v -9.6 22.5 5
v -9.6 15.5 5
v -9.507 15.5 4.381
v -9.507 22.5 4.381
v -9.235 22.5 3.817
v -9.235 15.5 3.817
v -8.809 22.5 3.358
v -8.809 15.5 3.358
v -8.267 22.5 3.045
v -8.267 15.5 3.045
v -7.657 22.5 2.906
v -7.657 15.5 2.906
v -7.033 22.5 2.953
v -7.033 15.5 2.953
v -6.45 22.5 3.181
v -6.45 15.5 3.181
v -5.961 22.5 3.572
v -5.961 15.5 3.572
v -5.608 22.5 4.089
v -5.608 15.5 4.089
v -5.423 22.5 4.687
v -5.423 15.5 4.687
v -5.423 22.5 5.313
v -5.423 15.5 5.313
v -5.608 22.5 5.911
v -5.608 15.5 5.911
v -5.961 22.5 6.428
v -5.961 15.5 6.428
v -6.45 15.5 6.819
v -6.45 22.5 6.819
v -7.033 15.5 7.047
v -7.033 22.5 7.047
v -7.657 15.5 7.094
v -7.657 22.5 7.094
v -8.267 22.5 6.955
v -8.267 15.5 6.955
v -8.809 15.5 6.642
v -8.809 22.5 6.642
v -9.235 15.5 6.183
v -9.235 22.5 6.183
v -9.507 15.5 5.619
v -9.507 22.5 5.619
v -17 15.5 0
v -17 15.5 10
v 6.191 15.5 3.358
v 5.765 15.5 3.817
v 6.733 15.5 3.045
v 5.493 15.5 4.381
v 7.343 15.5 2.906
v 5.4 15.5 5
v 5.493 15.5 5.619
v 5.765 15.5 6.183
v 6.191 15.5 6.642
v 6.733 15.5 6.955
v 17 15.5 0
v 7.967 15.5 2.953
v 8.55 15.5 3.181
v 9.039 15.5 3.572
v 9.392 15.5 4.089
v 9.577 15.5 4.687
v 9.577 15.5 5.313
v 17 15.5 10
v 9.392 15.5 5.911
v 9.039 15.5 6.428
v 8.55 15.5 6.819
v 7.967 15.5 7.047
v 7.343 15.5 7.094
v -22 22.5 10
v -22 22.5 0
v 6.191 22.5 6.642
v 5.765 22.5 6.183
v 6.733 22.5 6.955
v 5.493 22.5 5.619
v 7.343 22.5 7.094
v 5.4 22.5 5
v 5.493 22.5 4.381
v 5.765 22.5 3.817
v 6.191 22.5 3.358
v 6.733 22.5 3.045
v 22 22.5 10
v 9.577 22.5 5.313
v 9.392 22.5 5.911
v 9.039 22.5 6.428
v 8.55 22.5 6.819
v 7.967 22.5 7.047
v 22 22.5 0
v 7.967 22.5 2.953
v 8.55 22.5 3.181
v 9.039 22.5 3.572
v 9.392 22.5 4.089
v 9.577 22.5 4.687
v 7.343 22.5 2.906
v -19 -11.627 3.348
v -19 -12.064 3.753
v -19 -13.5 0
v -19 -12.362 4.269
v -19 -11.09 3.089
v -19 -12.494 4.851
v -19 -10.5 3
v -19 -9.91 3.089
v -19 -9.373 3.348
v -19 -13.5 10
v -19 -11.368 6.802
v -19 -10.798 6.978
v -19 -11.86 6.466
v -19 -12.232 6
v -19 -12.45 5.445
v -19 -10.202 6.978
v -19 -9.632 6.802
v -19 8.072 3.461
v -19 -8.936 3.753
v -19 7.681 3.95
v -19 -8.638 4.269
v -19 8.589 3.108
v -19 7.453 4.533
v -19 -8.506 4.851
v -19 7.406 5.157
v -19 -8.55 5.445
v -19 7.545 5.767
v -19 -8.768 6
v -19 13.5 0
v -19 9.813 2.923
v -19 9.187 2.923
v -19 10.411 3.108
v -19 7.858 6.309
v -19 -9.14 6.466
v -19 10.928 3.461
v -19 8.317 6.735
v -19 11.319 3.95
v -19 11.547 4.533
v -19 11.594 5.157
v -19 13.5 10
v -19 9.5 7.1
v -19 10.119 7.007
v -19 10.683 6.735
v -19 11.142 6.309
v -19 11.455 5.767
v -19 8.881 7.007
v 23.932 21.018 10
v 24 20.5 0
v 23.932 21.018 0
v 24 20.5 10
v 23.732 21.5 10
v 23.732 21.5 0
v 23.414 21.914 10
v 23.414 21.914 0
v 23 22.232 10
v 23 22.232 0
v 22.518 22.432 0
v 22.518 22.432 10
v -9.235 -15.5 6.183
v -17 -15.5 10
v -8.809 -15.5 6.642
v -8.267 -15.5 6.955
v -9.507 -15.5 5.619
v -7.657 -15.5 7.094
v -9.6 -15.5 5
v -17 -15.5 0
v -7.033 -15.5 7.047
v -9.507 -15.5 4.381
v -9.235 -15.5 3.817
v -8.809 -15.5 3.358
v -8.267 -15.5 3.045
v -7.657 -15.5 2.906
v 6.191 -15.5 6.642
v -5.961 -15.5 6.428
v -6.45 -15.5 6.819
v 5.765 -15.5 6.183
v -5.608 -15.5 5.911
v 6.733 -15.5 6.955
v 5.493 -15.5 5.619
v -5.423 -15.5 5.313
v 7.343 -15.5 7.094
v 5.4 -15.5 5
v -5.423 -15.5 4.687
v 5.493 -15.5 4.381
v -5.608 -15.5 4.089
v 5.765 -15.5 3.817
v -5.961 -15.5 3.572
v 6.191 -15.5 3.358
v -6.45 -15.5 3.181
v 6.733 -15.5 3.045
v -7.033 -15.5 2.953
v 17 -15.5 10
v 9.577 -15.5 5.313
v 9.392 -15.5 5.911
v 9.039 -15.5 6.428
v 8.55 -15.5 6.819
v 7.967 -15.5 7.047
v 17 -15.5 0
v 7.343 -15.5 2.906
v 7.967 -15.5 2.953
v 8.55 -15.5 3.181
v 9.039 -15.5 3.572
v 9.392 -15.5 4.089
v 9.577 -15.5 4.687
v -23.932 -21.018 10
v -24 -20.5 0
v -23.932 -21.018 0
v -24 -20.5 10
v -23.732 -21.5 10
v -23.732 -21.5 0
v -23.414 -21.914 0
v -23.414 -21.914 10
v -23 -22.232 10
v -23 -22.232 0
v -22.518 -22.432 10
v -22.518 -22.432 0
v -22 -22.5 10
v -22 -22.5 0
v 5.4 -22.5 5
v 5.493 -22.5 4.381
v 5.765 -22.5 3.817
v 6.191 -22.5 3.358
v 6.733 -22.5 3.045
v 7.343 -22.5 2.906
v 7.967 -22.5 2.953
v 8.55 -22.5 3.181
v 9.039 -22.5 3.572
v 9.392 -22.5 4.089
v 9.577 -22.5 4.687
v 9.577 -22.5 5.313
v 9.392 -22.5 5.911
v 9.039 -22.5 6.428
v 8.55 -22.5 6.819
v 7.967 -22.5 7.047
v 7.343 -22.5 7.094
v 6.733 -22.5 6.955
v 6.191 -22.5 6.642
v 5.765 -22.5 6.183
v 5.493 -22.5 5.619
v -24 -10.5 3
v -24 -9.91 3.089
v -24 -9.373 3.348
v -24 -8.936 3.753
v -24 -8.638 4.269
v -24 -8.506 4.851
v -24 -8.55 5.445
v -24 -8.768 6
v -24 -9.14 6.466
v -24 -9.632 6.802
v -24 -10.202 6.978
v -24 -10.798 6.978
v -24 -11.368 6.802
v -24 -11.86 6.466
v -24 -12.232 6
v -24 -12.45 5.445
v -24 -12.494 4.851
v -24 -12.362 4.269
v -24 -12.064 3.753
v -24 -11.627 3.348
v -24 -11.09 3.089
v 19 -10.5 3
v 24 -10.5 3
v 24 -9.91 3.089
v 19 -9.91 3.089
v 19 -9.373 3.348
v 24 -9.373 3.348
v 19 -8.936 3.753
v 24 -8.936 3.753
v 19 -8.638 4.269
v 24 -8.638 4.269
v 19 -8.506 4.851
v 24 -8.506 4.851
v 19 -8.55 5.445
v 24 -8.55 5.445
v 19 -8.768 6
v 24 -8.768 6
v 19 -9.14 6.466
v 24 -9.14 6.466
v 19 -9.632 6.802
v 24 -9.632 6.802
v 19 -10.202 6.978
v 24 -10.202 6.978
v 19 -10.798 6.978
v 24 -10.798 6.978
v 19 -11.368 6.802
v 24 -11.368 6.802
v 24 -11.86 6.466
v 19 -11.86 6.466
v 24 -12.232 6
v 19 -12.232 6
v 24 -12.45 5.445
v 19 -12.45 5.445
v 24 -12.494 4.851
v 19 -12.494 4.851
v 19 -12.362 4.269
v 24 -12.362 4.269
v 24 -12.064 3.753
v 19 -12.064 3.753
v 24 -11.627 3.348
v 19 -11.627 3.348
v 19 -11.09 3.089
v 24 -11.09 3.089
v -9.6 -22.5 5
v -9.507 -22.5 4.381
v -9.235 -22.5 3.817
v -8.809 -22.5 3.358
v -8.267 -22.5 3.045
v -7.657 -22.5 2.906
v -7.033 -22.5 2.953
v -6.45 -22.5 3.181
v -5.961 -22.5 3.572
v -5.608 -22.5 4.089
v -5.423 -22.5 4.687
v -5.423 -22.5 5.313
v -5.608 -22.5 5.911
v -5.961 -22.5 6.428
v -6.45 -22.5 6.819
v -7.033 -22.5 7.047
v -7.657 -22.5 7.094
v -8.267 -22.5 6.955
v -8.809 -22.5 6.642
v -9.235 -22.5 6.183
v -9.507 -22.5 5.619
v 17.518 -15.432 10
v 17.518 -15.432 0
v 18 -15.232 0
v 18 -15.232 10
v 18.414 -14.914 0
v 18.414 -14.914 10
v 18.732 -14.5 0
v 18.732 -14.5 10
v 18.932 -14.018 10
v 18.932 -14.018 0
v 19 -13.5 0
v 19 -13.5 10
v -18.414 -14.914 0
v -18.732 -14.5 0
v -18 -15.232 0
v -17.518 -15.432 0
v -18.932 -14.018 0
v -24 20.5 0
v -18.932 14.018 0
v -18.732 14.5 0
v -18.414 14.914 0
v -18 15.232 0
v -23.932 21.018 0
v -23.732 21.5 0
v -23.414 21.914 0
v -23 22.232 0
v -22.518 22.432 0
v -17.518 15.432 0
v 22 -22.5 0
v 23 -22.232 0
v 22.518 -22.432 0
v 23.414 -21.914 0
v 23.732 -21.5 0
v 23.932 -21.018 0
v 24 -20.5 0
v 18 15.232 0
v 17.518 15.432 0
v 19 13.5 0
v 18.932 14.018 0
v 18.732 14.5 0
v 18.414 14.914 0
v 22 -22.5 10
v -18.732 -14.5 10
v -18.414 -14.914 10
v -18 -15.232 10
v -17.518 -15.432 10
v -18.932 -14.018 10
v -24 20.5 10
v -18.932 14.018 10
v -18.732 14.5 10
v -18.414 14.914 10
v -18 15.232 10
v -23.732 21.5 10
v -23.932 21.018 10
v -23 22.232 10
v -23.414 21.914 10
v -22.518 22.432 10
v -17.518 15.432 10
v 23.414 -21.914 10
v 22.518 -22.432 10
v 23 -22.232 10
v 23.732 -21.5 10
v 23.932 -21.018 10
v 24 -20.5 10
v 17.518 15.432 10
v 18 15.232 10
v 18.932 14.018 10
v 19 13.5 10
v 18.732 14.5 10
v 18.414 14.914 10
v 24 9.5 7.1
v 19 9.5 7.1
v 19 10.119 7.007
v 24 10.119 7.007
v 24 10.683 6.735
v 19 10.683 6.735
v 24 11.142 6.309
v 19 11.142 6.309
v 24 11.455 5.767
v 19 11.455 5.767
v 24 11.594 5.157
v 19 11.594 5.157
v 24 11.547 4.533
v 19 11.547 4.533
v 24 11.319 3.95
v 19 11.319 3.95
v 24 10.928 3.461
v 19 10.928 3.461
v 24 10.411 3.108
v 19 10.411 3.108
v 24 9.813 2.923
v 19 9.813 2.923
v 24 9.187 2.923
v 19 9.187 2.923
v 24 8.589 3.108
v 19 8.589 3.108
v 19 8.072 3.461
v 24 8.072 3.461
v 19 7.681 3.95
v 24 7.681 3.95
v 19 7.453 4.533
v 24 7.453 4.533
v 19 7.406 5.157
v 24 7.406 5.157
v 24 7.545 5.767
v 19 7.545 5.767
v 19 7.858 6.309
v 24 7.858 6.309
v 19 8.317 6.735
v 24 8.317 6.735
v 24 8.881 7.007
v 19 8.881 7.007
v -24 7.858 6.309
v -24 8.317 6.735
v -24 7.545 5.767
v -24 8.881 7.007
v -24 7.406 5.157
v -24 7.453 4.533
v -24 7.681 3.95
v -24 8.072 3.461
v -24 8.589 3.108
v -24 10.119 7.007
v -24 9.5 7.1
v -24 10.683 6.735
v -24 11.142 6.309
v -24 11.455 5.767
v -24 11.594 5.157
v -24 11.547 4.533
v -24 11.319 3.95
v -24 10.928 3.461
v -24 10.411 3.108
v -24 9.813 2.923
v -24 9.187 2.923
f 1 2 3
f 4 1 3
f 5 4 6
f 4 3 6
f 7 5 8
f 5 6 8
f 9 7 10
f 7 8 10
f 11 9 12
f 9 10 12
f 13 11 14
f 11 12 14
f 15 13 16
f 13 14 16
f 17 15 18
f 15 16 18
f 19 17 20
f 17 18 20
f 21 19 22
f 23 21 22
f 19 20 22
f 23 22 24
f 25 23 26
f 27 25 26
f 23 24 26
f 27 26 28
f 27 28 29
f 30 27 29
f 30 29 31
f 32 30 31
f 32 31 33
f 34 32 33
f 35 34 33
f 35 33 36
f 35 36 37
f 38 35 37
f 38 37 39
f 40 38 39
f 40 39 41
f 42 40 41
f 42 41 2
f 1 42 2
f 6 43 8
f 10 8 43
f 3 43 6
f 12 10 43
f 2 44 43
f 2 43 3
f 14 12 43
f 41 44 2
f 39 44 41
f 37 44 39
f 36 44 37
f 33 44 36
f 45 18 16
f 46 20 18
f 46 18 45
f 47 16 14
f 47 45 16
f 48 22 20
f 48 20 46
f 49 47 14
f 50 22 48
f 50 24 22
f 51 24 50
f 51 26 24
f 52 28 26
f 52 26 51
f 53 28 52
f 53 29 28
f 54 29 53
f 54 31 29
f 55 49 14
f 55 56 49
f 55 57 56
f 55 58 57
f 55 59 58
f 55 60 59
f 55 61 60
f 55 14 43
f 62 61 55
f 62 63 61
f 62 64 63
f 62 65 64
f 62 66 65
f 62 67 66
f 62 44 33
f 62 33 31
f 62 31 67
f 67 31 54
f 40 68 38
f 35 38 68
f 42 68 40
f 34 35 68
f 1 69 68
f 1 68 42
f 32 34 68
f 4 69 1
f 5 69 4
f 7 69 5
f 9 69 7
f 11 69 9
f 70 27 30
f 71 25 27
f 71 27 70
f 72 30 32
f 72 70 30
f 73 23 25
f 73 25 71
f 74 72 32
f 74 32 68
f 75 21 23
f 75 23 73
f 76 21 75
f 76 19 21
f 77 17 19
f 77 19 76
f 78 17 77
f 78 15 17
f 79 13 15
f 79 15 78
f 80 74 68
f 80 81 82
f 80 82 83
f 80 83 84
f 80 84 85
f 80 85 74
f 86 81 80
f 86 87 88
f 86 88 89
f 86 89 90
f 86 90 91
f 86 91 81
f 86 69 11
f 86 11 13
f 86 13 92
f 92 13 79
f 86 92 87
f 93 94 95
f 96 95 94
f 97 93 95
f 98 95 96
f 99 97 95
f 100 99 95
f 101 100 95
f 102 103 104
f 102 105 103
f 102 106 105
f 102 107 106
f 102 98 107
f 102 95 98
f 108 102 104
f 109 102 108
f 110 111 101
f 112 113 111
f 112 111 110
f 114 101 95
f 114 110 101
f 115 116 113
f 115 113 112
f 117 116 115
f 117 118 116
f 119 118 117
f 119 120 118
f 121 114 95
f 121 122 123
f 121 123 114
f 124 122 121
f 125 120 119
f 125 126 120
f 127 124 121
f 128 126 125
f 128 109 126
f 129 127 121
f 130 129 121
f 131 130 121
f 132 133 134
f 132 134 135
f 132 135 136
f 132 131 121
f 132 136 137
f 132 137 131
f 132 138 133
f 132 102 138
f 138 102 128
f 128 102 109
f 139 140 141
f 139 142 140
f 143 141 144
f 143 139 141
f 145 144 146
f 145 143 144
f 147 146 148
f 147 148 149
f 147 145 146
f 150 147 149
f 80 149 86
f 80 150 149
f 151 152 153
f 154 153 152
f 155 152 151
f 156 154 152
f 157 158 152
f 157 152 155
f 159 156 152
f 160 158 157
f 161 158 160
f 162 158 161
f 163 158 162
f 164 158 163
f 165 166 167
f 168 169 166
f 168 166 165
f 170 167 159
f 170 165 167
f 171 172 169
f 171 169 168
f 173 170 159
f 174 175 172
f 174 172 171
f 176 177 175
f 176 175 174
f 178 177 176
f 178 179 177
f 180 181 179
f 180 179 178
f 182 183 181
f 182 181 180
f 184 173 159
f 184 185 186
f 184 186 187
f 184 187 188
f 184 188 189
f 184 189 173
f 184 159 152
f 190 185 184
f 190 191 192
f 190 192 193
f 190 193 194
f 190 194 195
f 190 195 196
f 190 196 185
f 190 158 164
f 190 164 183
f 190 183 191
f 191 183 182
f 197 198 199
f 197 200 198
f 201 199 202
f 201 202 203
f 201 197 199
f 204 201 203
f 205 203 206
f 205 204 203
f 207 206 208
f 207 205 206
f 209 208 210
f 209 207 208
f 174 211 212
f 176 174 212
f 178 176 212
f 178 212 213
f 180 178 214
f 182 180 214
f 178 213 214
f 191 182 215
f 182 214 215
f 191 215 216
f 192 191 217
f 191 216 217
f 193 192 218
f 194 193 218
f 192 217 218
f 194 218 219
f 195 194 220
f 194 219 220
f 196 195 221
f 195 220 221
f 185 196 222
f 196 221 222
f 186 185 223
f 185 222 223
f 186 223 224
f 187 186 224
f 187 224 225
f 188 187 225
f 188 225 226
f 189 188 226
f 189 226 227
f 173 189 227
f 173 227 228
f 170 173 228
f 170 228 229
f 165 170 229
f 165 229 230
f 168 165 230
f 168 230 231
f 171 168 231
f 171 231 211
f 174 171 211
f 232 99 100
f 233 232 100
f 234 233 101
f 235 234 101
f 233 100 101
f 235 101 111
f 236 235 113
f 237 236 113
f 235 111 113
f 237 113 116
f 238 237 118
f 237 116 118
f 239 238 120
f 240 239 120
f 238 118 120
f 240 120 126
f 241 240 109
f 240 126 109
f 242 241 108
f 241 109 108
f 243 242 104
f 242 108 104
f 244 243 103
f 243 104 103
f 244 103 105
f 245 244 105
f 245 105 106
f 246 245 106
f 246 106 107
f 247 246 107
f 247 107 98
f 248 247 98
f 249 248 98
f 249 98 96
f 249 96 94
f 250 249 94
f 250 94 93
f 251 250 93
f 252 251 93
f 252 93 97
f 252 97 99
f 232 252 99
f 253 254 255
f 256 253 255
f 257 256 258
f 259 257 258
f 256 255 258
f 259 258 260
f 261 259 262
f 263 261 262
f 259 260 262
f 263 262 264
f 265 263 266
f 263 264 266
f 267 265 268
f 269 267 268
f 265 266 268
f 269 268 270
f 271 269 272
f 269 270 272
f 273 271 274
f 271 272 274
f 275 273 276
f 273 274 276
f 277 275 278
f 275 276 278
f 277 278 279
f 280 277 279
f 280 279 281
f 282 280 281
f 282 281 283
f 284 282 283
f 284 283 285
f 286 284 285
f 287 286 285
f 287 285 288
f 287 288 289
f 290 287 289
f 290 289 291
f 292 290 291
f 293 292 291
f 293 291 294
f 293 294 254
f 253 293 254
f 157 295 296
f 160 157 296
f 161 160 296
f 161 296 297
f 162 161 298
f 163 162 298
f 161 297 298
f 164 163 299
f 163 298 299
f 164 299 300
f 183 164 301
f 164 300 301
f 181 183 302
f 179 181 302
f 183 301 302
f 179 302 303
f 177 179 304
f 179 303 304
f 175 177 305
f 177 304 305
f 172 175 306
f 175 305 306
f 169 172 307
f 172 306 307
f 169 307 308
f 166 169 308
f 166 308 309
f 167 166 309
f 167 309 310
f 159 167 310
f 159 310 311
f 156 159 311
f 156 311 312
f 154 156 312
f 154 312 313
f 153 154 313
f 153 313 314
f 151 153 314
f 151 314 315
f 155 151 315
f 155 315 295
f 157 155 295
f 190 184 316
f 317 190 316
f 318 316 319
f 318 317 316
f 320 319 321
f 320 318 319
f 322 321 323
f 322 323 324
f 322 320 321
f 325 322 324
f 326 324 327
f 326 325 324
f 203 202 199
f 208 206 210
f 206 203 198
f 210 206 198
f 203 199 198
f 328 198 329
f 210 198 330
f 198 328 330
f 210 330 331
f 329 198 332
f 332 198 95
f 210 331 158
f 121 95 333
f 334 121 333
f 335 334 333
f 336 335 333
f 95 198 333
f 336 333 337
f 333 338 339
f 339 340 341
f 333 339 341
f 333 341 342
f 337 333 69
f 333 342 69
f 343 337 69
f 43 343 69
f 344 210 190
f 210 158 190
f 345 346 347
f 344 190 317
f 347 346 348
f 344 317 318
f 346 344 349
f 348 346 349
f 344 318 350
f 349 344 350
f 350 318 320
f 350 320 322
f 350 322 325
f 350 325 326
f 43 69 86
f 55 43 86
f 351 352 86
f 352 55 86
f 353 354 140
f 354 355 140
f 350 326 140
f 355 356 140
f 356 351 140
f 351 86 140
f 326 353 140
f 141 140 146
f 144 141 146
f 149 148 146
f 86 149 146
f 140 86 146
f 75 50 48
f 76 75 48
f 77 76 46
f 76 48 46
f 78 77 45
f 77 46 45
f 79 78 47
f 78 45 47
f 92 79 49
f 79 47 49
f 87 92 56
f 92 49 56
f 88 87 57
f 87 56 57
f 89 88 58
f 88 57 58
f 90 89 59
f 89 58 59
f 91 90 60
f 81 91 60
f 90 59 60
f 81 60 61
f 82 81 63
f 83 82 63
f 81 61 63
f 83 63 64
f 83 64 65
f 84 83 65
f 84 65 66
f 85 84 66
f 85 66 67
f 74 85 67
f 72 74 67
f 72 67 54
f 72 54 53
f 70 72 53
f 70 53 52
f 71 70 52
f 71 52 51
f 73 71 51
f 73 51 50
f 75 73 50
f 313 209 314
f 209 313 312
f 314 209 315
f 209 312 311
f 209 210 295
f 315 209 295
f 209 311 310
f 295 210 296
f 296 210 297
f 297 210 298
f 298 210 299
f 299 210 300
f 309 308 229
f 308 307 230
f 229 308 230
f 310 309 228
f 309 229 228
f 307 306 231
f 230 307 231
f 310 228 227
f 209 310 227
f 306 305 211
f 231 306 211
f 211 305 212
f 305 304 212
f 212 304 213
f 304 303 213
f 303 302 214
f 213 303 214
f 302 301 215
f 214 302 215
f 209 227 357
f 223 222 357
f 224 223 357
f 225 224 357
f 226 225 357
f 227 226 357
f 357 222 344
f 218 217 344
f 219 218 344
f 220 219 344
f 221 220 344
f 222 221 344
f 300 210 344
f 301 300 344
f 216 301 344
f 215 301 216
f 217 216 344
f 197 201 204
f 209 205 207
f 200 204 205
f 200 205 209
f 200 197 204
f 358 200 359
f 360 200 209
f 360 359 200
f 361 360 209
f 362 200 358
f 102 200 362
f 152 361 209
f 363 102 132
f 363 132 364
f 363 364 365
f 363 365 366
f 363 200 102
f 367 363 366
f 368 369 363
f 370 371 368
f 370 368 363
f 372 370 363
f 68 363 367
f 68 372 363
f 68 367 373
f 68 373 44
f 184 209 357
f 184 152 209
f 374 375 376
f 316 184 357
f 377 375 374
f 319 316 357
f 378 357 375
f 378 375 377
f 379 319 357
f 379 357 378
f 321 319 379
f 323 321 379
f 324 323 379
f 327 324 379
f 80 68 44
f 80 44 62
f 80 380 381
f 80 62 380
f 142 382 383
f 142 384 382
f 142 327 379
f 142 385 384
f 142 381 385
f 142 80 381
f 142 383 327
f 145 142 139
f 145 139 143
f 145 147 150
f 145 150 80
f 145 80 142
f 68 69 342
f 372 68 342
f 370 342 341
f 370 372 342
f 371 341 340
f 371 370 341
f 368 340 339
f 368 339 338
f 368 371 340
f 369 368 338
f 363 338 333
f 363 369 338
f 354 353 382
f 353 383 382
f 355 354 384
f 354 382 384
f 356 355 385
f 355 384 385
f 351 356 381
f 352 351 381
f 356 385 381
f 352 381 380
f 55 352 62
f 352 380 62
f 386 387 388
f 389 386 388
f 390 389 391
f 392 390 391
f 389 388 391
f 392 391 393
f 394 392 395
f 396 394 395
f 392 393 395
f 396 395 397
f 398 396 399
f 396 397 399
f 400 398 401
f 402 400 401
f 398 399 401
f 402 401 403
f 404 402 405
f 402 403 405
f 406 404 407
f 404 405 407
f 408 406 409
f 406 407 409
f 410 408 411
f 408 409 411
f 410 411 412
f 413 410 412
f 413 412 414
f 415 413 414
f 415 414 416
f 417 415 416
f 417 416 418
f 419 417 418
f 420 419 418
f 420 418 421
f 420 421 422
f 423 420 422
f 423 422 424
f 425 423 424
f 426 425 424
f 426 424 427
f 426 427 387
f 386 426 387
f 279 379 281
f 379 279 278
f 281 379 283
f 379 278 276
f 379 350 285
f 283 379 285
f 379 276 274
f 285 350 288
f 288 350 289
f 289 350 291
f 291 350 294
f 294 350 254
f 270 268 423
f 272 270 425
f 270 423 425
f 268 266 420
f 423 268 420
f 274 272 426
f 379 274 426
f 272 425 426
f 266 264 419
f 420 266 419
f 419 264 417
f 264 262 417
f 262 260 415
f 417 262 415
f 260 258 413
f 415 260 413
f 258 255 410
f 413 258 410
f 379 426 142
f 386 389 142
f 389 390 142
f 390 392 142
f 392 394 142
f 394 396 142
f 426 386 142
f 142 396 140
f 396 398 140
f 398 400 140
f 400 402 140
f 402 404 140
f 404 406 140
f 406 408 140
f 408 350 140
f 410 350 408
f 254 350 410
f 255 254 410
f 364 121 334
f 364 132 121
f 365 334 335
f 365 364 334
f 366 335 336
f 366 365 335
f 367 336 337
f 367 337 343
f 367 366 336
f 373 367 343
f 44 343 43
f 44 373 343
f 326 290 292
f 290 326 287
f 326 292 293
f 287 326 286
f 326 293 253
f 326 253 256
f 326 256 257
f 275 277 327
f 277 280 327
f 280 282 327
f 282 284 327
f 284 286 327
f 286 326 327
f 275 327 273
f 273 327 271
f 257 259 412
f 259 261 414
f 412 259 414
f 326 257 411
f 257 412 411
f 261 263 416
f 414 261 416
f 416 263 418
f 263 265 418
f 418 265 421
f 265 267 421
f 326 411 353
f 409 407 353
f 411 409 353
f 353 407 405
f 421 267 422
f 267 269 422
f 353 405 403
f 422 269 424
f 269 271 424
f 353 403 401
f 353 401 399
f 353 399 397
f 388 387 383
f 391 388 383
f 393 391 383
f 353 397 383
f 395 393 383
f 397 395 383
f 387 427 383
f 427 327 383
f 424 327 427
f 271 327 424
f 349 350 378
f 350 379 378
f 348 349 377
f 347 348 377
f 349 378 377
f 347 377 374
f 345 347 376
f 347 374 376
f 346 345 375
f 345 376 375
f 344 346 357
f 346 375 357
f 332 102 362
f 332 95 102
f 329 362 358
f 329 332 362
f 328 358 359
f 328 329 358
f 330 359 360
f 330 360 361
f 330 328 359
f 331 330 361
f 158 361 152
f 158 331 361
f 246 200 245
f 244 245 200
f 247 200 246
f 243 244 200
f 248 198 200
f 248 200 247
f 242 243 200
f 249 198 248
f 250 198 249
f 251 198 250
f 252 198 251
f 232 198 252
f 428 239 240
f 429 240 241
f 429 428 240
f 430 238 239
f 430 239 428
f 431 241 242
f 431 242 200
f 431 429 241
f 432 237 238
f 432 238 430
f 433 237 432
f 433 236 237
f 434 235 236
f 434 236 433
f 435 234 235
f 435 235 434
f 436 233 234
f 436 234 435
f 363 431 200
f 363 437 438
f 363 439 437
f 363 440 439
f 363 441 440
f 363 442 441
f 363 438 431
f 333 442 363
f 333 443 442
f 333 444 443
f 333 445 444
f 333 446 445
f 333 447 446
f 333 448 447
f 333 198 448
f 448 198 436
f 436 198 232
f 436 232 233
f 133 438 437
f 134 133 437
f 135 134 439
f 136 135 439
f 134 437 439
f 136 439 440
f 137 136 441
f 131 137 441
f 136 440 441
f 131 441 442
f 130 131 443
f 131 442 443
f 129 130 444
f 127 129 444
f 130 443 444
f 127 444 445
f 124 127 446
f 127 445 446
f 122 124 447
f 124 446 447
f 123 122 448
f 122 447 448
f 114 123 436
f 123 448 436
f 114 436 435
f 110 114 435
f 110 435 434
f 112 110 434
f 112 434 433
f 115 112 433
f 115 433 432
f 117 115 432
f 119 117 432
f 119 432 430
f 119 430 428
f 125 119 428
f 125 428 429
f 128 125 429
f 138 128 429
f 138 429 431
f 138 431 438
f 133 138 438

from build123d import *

# Parameters (mm, degrees)
SKETCH_1_W               = 48
SKETCH_1_H               = 45
EXTRUDE_1_DEPTH          = 10
SKETCH_2_R               = 2.5
CUT_EXTRUDE_1_DEPTH      = 1
CUT_EXTRUDE_1_DEPTH_BACK = 46
SKETCH_3_R               = 2
CUT_EXTRUDE_2_DEPTH      = 49
SKETCH_4_R               = 1.75
CUT_EXTRUDE_3_DEPTH      = 1.0000001
CUT_EXTRUDE_3_DEPTH_BACK = 49.0000001
SKETCH_5_W               = 17.7
SKETCH_5_H               = 17
CUT_EXTRUDE_4_DEPTH      = 11
SKETCH_6_W               = 17.7
SKETCH_6_H               = 1.5
SKETCH_6_H_2             = 2.5
CUT_EXTRUDE_5_DEPTH      = 11
SKETCH_8_R               = 2.5
EXTRUDE_2_DEPTH          = 45
SKETCH_10_R              = 1.75
CUT_EXTRUDE_8_DEPTH      = 45
SKETCH_16_W              = 38
SKETCH_16_H              = 37
CUT_EXTRUDE_13_DEPTH     = 11
SKETCH_17_W              = 38
SKETCH_17_H              = 10
SKETCH_17_R              = 1.75
EXTRUDE_4_DEPTH          = 3.5
SKETCH_18_W              = 38
SKETCH_18_H              = 10
SKETCH_18_R              = 1.75
EXTRUDE_5_DEPTH          = 2.5
FILLET_2_R               = 2
HOLE_WIZARD_M5_2_D       = 4.2
HOLE_WIZARD_M5_2_DEPTH   = 45
HOLE_WIZARD_M5_3_D       = 4.2
HOLE_WIZARD_M5_3_DEPTH   = 48
FILLET_3_R               = 2


with BuildPart() as part:
    # 草图1 → 凸台-拉伸1 (new body)
    with BuildSketch(Plane.XY):
        Rectangle(SKETCH_1_W, SKETCH_1_H)
    extrude(amount=EXTRUDE_1_DEPTH)

    # 草图2 → 切除-拉伸1 (cut, two sides)
    with BuildSketch(Plane(origin=(0, 22.5, 0), x_dir=(1, 0, 0), z_dir=(0, 1, 0))) as cut_extrude_1_sk:
        with Locations((10, -5)):
            Circle(SKETCH_2_R)
        with Locations((-10, -5)):
            Circle(SKETCH_2_R)
    extrude(amount=CUT_EXTRUDE_1_DEPTH, mode=Mode.SUBTRACT)
    extrude(cut_extrude_1_sk.sketch, amount=-CUT_EXTRUDE_1_DEPTH_BACK, mode=Mode.SUBTRACT)

    # 草图3 → 切除-拉伸2 (cut, through all)
    with BuildSketch(Plane(origin=(24, 0, 0), x_dir=(0, 0, -1), z_dir=(1, 0, 0))):
        with Locations((-5, -10.5)):
            Circle(SKETCH_3_R)
    extrude(amount=-CUT_EXTRUDE_2_DEPTH, mode=Mode.SUBTRACT)

    # 草图4 → 切除-拉伸3 (cut, two sides)
    with BuildSketch(Plane(origin=(24, 0, 0), x_dir=(0, 0, -1), z_dir=(1, 0, 0))) as cut_extrude_3_sk:
        with Locations((-5, 9.5)):
            Circle(SKETCH_4_R)
    extrude(amount=CUT_EXTRUDE_3_DEPTH, mode=Mode.SUBTRACT)
    extrude(cut_extrude_3_sk.sketch, amount=-CUT_EXTRUDE_3_DEPTH_BACK, mode=Mode.SUBTRACT)

    # 草图5 → 切除-拉伸4 (cut, through all)
    with BuildSketch(Plane.XY.offset(10)):
        with Locations((-10.15, -10.5)):
            Rectangle(SKETCH_5_W, SKETCH_5_H)
        with Locations((10.15, -10.5)):
            Rectangle(SKETCH_5_W, SKETCH_5_H)
        with Locations((-10.15, 9.5)):
            Rectangle(SKETCH_5_W, SKETCH_5_H)
        with Locations((10.15, 9.5)):
            Rectangle(SKETCH_5_W, SKETCH_5_H)
    extrude(amount=-CUT_EXTRUDE_4_DEPTH, mode=Mode.SUBTRACT)

    # 草图6 → 切除-拉伸5 (cut, through all)
    with BuildSketch(Plane.XY.offset(10)):
        with Locations((-10.15, 17.25)):
            Rectangle(SKETCH_6_W, SKETCH_6_H)
        with Locations((10.15, 17.25)):
            Rectangle(SKETCH_6_W, SKETCH_6_H)
        with Locations((-10.15, -0.25)):
            Rectangle(SKETCH_6_W, SKETCH_6_H_2)
        with Locations((10.15, -0.25)):
            Rectangle(SKETCH_6_W, SKETCH_6_H_2)
    extrude(amount=-CUT_EXTRUDE_5_DEPTH, mode=Mode.SUBTRACT)

    # 草图8 → 凸台-拉伸2 (add)
    with BuildSketch(Plane(origin=(0, 22.5, 0), x_dir=(1, 0, 0), z_dir=(0, 1, 0))):
        with Locations((10, -5)):
            Circle(SKETCH_8_R)
        with Locations((-10, -5)):
            Circle(SKETCH_8_R)
    extrude(amount=-EXTRUDE_2_DEPTH)

    # 草图10 → 切除-拉伸8 (cut)
    with BuildSketch(Plane(origin=(0, 22.5, 0), x_dir=(1, 0, 0), z_dir=(0, 1, 0))):
        with Locations((-7.5, -5)):
            Circle(SKETCH_10_R)
        with Locations((7.5, -5)):
            Circle(SKETCH_10_R)
    extrude(amount=-CUT_EXTRUDE_8_DEPTH, mode=Mode.SUBTRACT)

    # 草图16 → 切除-拉伸13 (cut, through all)
    with BuildSketch(Plane.XY.offset(10)):
        with Locations((0, -0.5)):
            Rectangle(SKETCH_16_W, SKETCH_16_H)
    extrude(amount=-CUT_EXTRUDE_13_DEPTH, mode=Mode.SUBTRACT)

    # 草图17 → 凸台-拉伸4 (add)
    with BuildSketch(Plane(origin=(0, -19, 0), x_dir=(1, 0, 0), z_dir=(0, 1, 0))):
        with Locations((0, -5)):
            Rectangle(SKETCH_17_W, SKETCH_17_H)
        with Locations((7.5, -5)):
            Circle(SKETCH_17_R, mode=Mode.SUBTRACT)
        with Locations((-7.5, -5)):
            Circle(SKETCH_17_R, mode=Mode.SUBTRACT)
    extrude(amount=EXTRUDE_4_DEPTH)

    # 草图18 → 凸台-拉伸5 (add)
    with BuildSketch(Plane.XZ.offset(-18)):
        with Locations((0, 5)):
            Rectangle(SKETCH_18_W, SKETCH_18_H)
        with Locations((-7.5, 5)):
            Circle(SKETCH_18_R, mode=Mode.SUBTRACT)
        with Locations((7.5, 5)):
            Circle(SKETCH_18_R, mode=Mode.SUBTRACT)
    extrude(amount=EXTRUDE_5_DEPTH)

    # 圆角2
    fillet_2_edges = [part.edges().sort_by_distance(p)[0] for p in [
        (-19, -15.5, 5),
        (19, -15.5, 5),
        (19, 15.5, 5),
        (-19, 15.5, 5),
    ]]
    fillet(fillet_2_edges, radius=FILLET_2_R)

    # M5 螺纹孔的螺纹孔钻头2
    with Locations(Plane(origin=(0, 22.5, 0), x_dir=(1, 0, 0), z_dir=(0, 1, 0))):
        with Locations((-7.5, -5), (7.5, -5)):
            Hole(HOLE_WIZARD_M5_2_D / 2, depth=HOLE_WIZARD_M5_2_DEPTH)

    # M5 螺纹孔的螺纹孔钻头3
    with Locations(Plane(origin=(24, 0, 0), x_dir=(0, 0, -1), z_dir=(1, 0, 0))):
        with Locations((-5, 9.5)):
            Hole(HOLE_WIZARD_M5_3_D / 2, depth=HOLE_WIZARD_M5_3_DEPTH)

    # 圆角3
    fillet_3_edges = [part.edges().sort_by_distance(p)[0] for p in [
        (24, -22.5, 5),
        (-24, -22.5, 5),
        (-24, 22.5, 5),
        (24, 22.5, 5),
    ]]
    fillet(fillet_3_edges, radius=FILLET_3_R)


solid = part.part
